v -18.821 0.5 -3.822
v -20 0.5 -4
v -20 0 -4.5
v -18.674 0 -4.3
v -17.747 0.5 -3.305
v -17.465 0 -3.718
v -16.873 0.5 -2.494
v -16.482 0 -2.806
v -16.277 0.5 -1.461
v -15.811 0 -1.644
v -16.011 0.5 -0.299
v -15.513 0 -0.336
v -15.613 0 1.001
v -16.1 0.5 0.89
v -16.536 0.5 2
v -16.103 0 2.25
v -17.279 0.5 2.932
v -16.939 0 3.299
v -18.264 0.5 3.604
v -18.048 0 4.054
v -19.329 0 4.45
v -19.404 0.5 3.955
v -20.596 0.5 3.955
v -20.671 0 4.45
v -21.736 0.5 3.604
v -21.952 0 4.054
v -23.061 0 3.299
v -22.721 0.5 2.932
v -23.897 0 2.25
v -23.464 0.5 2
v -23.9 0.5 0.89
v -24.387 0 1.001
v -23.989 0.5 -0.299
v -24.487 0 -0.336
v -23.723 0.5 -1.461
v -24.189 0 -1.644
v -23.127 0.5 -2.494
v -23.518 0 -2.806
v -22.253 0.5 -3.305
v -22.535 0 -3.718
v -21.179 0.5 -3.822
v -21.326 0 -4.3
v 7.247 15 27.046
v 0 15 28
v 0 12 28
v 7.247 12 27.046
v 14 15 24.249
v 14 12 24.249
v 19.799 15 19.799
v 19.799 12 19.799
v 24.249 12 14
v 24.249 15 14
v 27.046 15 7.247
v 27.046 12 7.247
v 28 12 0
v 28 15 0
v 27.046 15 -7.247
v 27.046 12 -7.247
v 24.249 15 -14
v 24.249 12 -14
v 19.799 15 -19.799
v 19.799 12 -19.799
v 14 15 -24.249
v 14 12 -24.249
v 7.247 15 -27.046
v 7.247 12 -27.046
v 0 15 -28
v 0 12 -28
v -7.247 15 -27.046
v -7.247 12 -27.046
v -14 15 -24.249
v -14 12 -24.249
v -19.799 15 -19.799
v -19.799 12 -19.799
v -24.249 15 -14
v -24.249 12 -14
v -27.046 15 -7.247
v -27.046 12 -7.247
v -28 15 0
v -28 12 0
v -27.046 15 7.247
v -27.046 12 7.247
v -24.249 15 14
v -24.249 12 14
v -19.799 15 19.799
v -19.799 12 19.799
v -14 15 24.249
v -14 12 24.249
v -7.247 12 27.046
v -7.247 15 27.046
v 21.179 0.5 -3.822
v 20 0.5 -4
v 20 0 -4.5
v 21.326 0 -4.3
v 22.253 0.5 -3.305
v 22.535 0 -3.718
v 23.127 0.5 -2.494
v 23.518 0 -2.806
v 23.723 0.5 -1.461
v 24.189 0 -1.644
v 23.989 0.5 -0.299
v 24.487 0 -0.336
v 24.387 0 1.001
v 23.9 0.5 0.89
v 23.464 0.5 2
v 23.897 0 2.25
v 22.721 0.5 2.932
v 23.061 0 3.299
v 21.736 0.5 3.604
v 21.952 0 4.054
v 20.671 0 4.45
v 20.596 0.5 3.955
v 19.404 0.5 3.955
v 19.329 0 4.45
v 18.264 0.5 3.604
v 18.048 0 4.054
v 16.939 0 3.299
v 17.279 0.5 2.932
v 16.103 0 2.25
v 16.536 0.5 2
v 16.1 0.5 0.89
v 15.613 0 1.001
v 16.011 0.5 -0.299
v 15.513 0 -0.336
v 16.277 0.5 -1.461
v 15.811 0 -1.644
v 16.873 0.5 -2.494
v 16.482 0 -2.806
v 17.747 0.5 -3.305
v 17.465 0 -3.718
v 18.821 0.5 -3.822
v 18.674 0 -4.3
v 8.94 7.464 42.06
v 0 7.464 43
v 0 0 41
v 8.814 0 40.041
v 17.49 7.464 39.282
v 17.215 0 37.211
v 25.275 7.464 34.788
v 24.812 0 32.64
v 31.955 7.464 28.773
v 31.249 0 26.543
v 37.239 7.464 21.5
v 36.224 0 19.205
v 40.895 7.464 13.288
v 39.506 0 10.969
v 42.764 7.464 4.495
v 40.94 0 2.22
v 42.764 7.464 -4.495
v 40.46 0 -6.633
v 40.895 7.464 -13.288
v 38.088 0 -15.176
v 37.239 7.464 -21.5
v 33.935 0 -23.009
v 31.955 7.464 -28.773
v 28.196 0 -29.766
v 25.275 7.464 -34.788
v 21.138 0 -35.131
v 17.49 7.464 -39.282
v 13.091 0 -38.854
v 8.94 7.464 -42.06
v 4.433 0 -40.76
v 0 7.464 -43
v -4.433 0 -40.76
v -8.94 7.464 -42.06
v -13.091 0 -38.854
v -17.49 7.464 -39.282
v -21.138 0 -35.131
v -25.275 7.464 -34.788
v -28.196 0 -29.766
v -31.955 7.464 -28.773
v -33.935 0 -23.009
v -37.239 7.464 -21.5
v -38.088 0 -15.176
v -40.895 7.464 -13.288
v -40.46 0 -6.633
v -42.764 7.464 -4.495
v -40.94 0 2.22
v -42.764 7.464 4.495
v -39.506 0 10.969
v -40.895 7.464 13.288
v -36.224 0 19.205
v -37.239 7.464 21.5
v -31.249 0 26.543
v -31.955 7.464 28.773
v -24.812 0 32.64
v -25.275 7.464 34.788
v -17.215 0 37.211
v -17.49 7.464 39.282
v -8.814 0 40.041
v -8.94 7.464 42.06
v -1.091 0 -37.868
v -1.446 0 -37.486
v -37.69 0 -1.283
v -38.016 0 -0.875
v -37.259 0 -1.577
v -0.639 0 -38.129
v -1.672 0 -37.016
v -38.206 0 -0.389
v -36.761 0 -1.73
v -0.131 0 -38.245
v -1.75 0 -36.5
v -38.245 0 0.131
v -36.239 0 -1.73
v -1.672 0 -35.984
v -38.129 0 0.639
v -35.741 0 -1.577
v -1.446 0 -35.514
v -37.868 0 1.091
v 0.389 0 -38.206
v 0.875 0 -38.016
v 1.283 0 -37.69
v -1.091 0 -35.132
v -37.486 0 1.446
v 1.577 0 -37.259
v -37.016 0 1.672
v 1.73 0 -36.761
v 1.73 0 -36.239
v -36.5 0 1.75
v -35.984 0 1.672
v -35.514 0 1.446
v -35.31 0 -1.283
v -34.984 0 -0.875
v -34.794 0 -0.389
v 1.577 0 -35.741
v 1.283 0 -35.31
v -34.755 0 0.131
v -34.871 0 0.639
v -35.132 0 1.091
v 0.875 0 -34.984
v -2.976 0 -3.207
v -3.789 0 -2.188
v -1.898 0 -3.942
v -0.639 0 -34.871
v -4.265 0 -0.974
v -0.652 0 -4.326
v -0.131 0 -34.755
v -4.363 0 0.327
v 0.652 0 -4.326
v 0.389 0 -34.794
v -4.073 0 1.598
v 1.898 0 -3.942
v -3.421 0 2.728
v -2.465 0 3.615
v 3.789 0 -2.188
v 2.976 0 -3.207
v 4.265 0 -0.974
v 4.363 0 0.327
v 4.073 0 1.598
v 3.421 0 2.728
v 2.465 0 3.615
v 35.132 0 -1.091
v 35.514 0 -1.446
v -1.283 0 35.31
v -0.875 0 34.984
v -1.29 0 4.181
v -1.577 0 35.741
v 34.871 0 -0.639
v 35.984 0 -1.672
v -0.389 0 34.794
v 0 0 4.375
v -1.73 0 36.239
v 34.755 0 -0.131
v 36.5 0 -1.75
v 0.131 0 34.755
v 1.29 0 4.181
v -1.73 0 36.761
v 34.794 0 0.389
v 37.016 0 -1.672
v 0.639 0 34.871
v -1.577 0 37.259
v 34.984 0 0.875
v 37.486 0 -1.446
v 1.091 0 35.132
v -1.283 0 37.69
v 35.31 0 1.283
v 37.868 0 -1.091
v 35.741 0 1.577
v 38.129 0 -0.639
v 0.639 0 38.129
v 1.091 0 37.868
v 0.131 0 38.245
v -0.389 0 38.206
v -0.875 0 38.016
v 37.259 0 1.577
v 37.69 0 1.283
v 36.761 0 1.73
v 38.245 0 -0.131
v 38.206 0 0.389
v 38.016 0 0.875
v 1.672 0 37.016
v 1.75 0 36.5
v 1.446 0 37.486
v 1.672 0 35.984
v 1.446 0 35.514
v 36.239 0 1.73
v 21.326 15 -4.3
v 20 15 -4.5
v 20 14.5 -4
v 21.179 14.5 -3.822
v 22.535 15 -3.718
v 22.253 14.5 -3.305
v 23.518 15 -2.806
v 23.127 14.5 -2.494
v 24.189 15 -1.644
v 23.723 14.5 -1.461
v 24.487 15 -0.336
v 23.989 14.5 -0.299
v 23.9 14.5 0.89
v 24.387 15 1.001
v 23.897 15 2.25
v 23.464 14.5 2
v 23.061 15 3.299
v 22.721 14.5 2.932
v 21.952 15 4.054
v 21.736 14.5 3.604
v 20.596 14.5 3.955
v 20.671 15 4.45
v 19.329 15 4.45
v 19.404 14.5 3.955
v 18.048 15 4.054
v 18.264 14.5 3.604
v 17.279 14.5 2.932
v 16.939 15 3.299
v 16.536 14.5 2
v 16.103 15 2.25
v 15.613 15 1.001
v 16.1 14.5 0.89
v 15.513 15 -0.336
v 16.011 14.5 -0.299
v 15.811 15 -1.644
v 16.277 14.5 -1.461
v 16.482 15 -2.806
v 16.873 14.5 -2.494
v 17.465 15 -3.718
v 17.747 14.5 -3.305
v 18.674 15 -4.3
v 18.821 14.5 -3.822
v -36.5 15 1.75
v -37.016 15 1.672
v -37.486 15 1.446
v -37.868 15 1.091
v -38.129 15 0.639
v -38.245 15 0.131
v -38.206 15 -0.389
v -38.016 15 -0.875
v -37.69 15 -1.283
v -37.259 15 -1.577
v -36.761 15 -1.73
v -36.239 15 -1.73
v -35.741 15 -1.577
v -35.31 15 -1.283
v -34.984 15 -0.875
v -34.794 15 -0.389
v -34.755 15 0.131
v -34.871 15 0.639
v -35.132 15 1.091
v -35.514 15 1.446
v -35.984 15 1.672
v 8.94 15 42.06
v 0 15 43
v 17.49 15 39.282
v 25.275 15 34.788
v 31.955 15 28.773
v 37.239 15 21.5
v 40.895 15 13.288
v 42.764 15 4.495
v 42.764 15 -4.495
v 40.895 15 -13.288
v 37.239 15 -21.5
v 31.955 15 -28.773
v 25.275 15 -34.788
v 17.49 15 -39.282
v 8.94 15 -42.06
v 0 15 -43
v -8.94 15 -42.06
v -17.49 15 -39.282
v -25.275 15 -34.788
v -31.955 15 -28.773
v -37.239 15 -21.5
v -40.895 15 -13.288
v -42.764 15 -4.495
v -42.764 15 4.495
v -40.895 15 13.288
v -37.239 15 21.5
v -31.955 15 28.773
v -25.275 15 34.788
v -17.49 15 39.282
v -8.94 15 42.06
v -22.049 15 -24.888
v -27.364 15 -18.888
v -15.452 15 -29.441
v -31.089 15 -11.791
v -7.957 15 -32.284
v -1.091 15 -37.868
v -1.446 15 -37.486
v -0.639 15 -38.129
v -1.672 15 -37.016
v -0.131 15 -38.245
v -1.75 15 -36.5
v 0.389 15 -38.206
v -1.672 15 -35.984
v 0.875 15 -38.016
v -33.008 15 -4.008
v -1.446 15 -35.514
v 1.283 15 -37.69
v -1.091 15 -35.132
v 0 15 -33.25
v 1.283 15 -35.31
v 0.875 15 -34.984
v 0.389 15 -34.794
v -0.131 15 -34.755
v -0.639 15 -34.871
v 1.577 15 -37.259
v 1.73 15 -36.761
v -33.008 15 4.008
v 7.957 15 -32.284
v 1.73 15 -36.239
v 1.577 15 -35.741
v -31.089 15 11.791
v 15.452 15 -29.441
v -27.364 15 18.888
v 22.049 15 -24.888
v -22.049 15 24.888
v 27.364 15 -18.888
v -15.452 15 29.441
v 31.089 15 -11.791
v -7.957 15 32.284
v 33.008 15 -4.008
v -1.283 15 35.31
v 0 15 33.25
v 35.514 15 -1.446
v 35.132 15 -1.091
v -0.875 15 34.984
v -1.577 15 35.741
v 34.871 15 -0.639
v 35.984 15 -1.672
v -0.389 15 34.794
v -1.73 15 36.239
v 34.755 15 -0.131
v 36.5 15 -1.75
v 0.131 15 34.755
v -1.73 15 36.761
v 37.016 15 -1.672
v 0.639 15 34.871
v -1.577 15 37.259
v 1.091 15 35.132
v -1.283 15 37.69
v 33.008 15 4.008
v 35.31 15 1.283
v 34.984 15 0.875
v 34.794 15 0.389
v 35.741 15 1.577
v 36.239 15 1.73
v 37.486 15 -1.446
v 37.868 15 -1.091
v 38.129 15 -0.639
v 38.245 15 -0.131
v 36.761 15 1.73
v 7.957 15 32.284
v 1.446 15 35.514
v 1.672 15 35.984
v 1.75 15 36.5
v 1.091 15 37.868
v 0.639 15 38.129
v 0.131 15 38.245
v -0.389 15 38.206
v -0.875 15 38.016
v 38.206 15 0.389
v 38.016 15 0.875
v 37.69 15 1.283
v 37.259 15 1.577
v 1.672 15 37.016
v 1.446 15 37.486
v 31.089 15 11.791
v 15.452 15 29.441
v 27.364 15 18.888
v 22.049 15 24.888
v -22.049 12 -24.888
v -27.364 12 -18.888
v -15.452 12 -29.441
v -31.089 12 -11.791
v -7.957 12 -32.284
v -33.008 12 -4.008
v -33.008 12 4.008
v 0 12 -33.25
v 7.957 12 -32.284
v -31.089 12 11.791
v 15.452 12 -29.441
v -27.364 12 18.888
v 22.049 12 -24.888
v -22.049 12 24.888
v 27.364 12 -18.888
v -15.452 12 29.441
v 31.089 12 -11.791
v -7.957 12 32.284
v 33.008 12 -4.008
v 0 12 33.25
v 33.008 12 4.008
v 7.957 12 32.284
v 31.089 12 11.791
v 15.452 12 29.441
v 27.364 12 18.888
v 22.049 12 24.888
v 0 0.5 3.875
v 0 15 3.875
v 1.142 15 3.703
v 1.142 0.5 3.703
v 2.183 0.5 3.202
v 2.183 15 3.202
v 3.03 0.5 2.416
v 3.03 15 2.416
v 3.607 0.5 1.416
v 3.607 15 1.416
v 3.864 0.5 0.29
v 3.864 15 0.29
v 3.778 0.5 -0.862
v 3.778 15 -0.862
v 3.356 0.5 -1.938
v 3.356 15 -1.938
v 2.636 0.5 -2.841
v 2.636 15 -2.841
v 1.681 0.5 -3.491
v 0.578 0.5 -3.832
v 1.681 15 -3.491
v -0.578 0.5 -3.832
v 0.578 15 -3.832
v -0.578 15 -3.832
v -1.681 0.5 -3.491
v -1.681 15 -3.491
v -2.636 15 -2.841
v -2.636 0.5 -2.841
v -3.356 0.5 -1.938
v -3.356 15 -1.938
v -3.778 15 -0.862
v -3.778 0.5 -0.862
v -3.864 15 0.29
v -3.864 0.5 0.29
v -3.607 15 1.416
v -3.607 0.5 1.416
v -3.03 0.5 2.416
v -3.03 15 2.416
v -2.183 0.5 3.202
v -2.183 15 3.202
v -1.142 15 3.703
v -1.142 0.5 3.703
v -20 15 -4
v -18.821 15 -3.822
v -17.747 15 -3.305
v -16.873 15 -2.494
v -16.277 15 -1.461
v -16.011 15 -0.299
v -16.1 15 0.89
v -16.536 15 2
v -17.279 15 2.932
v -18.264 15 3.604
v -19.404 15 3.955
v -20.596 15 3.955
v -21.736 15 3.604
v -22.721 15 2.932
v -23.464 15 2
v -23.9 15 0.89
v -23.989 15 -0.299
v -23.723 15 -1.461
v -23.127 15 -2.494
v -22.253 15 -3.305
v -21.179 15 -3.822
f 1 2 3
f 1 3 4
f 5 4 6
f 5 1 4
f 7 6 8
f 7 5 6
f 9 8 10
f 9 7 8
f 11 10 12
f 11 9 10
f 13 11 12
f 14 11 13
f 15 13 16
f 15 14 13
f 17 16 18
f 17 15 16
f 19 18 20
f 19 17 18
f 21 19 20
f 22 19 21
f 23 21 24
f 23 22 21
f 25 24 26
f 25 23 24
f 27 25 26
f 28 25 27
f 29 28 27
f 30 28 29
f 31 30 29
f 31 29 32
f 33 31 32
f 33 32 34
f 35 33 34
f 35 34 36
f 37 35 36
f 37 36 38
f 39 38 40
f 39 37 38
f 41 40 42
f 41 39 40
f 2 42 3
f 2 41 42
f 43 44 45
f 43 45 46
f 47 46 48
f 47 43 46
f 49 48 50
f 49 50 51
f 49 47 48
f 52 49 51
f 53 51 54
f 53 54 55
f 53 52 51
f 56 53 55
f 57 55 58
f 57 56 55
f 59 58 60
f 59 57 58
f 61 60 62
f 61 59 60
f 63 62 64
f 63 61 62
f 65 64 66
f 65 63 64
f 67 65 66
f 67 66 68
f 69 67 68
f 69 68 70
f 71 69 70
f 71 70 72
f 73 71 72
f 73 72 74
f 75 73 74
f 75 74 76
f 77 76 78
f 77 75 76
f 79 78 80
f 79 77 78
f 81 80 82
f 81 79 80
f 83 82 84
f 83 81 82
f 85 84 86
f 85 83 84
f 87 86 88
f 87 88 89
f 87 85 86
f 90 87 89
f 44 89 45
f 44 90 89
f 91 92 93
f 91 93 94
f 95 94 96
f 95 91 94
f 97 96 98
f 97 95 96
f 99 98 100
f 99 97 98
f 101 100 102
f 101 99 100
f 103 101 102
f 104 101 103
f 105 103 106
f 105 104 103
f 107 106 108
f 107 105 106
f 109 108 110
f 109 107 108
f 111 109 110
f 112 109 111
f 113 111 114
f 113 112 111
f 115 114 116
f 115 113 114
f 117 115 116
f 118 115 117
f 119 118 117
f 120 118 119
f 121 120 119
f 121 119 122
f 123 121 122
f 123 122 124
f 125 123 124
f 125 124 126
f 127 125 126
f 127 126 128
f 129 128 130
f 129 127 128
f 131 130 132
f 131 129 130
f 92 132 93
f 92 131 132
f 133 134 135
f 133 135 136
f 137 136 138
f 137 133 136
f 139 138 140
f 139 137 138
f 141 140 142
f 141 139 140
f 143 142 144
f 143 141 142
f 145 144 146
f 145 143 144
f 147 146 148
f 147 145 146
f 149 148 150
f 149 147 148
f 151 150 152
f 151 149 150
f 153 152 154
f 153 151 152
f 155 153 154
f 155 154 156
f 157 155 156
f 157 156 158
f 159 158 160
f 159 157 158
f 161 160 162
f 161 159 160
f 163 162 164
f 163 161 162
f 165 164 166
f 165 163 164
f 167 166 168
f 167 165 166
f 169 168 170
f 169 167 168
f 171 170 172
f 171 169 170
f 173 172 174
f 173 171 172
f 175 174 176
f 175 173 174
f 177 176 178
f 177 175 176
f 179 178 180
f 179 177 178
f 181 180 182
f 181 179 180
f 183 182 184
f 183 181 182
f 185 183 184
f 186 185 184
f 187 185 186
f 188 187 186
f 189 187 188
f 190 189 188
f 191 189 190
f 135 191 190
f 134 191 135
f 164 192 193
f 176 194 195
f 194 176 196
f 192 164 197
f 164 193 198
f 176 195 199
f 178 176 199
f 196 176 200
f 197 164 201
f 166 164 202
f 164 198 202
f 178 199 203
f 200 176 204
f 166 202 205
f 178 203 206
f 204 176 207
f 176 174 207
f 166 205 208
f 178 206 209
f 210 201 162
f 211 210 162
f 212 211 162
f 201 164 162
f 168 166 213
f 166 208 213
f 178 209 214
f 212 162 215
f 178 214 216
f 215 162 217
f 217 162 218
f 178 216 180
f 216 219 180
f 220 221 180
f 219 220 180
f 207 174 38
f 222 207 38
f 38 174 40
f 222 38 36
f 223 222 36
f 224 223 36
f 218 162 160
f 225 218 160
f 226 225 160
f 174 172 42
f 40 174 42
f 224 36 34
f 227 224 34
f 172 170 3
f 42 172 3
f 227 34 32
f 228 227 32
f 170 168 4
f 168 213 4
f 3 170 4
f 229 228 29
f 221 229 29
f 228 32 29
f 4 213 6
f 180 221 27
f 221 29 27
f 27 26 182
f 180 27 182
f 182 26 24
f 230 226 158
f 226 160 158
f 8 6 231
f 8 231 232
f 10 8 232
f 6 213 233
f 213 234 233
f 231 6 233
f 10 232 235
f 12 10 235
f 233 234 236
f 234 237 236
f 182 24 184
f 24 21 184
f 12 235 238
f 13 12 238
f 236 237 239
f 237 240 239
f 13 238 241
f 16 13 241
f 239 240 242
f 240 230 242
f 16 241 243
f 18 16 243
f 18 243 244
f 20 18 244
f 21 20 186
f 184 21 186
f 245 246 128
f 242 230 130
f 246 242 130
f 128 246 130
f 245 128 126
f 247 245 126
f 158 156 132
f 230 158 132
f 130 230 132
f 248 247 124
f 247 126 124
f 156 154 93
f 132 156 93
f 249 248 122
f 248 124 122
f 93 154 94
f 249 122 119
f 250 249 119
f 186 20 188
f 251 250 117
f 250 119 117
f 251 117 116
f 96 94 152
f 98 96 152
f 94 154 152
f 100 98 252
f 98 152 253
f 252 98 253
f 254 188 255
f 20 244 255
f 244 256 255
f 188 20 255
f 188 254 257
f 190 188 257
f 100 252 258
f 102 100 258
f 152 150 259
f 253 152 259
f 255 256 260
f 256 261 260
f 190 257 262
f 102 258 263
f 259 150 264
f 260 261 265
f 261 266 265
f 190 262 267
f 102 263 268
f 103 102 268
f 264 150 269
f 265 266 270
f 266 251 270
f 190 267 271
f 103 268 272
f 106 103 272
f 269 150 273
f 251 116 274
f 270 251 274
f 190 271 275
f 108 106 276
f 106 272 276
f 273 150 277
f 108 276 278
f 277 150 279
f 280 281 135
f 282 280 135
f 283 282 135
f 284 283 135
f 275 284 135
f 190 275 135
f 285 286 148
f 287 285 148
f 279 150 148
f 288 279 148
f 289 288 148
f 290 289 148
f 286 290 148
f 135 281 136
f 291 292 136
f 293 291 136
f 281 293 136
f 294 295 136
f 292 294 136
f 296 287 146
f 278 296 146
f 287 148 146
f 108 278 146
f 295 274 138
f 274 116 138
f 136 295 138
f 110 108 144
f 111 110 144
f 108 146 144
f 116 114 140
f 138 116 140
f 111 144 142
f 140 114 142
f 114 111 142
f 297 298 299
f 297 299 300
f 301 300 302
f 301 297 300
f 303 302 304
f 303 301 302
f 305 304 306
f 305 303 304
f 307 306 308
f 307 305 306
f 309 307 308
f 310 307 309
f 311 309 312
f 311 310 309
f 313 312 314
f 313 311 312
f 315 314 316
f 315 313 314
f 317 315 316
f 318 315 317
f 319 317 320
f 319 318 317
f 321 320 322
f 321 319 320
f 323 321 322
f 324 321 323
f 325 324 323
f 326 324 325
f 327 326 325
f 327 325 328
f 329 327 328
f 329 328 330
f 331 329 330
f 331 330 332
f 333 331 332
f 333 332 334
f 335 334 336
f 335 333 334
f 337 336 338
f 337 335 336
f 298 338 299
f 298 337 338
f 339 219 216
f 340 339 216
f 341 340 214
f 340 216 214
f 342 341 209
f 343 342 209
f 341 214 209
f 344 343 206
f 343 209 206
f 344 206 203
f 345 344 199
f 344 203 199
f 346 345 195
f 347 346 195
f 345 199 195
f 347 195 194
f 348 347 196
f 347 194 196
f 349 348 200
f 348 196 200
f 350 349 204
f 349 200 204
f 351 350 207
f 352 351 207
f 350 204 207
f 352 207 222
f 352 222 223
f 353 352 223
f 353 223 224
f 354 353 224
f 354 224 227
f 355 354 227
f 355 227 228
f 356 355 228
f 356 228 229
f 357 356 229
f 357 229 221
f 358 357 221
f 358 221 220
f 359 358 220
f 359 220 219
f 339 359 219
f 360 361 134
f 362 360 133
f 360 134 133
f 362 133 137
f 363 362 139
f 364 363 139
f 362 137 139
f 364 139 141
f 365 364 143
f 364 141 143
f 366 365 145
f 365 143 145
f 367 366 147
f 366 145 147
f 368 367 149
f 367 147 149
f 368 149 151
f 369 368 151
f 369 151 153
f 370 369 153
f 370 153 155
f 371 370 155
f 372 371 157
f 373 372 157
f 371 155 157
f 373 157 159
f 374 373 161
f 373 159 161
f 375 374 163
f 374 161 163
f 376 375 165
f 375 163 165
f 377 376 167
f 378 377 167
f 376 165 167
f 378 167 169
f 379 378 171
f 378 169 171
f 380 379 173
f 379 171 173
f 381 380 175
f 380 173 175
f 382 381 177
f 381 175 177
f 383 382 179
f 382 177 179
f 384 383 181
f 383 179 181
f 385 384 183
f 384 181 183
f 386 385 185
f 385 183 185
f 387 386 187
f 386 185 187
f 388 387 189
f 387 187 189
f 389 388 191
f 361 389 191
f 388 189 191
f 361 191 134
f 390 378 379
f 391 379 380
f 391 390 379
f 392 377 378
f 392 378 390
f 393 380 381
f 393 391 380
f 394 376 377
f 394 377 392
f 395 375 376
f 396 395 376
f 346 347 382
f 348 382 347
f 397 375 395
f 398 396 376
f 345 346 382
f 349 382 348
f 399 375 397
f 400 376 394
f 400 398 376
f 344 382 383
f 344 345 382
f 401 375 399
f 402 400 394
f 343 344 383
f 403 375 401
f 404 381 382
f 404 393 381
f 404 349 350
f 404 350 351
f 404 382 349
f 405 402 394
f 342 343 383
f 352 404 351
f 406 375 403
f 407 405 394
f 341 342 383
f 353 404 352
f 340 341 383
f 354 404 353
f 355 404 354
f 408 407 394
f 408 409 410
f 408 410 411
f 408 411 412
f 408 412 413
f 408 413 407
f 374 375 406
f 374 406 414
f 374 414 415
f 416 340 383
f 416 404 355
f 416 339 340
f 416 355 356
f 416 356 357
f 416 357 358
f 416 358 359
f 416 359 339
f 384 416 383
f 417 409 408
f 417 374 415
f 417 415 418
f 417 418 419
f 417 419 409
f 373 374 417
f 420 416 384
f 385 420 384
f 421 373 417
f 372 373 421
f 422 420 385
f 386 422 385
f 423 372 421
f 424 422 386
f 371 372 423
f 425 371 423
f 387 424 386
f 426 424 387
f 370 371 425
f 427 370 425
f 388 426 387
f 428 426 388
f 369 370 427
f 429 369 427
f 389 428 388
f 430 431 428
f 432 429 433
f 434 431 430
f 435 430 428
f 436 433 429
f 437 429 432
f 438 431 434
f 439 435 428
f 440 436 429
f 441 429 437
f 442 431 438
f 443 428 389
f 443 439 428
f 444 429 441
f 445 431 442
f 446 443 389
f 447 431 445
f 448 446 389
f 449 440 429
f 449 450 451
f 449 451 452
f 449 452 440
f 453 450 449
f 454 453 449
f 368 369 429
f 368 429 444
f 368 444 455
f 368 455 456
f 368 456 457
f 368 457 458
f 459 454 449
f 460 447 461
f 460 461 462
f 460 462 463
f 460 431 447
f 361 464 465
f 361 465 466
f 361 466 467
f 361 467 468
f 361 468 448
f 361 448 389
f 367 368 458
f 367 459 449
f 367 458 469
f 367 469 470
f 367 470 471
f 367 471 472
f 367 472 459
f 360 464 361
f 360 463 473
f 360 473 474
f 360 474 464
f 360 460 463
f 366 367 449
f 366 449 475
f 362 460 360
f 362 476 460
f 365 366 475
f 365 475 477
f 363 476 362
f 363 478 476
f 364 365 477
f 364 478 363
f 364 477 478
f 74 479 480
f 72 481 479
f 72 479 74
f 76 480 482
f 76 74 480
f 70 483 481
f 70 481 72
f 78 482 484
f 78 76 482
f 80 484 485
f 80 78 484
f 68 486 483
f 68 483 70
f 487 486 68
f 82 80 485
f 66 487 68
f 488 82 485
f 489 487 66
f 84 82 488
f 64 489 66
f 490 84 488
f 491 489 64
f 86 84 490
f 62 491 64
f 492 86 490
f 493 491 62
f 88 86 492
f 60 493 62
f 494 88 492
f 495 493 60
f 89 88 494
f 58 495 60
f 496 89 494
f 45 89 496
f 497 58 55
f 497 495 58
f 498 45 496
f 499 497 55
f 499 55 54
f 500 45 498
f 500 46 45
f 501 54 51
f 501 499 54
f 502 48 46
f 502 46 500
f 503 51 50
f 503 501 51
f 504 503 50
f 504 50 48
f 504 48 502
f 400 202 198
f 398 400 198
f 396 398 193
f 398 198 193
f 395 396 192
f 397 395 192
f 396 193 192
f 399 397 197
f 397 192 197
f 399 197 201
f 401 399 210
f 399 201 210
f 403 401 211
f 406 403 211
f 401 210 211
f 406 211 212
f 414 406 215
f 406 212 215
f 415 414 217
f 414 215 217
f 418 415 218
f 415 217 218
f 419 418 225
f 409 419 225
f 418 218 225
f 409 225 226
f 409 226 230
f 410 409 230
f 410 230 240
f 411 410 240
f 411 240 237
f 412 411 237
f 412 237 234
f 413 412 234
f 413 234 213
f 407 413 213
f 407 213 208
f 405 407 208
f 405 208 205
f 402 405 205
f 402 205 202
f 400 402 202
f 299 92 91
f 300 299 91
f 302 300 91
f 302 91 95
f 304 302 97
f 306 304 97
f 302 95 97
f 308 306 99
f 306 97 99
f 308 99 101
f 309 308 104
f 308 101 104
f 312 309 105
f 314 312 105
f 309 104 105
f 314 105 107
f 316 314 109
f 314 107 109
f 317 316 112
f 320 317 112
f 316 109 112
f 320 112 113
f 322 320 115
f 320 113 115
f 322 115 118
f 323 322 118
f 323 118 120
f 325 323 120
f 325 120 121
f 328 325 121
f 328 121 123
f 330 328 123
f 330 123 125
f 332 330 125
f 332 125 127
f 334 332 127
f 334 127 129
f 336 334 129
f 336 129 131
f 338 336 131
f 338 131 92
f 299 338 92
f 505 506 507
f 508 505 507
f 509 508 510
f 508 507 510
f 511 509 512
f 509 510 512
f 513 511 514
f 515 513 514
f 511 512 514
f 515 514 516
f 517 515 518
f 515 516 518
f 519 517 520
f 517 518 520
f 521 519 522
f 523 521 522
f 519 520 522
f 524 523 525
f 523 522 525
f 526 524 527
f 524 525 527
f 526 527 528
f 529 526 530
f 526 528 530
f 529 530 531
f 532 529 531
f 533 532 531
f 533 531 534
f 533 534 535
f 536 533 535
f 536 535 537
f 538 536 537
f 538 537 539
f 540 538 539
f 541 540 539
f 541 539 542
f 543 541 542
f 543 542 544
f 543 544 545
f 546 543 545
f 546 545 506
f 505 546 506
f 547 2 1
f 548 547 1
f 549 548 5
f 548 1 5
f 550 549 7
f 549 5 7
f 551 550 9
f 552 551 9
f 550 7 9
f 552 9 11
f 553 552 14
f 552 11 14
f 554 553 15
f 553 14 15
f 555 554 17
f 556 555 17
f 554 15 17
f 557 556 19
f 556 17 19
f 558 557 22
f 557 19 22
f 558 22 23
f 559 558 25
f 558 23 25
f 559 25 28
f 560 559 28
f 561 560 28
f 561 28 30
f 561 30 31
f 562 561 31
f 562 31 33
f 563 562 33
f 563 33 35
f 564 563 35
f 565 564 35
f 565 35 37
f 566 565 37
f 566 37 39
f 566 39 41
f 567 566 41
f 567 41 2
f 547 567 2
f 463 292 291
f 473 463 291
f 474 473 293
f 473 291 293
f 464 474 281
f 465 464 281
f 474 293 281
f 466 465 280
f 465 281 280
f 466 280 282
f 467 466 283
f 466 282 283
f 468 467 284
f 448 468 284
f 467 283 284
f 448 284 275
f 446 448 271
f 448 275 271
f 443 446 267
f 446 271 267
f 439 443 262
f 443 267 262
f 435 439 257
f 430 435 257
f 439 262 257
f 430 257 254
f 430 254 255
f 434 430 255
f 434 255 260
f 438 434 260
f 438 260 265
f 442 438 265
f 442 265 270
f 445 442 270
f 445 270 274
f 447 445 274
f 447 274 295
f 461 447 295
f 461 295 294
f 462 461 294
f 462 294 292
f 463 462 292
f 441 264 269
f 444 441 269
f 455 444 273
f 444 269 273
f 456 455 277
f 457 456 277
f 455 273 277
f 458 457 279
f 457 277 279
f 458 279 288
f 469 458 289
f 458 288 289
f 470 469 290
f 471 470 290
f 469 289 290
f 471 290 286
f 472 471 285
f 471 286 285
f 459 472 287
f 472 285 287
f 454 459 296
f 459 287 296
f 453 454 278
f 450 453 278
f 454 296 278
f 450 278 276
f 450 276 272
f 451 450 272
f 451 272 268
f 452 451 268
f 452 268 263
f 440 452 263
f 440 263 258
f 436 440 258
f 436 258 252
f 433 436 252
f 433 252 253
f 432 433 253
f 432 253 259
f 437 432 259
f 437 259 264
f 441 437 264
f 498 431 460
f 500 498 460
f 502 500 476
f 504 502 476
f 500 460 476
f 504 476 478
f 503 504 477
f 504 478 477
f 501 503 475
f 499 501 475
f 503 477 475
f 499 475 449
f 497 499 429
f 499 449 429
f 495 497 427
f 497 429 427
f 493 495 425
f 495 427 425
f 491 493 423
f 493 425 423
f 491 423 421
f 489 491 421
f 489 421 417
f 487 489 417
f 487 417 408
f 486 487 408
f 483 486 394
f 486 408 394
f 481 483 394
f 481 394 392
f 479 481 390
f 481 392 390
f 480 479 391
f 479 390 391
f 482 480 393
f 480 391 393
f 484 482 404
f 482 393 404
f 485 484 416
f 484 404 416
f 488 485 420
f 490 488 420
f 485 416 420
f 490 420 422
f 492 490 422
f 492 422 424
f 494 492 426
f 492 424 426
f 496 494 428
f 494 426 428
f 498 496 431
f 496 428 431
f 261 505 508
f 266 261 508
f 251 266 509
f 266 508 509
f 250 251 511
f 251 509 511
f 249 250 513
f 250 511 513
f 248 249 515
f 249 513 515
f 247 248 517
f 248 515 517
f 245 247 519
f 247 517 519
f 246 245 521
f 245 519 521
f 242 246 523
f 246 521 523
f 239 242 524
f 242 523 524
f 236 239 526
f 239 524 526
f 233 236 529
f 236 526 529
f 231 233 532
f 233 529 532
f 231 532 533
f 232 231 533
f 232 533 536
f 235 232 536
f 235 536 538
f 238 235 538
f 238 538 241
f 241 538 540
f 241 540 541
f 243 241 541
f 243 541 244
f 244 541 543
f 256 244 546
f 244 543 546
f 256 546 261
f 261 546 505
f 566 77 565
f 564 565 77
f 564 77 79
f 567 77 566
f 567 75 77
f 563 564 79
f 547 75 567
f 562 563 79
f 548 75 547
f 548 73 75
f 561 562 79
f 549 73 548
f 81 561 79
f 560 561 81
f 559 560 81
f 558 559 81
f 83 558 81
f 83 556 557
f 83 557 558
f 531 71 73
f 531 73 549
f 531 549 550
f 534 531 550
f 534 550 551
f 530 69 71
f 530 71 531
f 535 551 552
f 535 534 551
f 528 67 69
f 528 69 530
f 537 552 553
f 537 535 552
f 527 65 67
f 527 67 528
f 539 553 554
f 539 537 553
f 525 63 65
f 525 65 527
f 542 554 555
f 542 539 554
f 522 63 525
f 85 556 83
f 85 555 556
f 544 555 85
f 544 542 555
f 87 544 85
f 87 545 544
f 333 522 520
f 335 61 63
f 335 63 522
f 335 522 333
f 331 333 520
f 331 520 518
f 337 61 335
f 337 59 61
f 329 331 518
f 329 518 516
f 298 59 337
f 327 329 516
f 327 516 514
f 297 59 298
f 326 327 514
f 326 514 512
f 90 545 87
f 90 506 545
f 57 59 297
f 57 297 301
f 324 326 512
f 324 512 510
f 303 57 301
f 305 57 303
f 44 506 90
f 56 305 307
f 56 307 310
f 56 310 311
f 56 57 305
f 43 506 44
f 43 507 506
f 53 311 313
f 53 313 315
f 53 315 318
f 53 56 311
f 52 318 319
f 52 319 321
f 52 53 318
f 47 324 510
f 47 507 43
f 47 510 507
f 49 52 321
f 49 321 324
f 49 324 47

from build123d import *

# Parameters (mm, degrees)
SKETCH1_R           = 43
BOSS_EXTRUDE1_DEPTH = 15
SKETCH2_R           = 4
CUT_EXTRUDE1_DEPTH  = 63.633856659
SKETCH3_R           = 3.875
CUT_EXTRUDE2_DEPTH  = 63.633856659
SKETCH4_R           = 33.25
SKETCH4_R_2         = 28
CUT_EXTRUDE3_DEPTH  = 3
SKETCH5_R           = 1.75
CUT_EXTRUDE4_DEPTH  = 63.633856659
CIRPATTERN1_COUNT   = 4
CHAMFER1_SIZE       = 2
CHAMFER1_SIZE2      = 7.464101615
CHAMFER2_SIZE       = 0.5


with BuildPart() as part:
    # Sketch1 → Boss-Extrude1 (new body)
    with BuildSketch(Plane(origin=(0, 0, 0), x_dir=(1, 0, 0), z_dir=(0, 1, 0))):
        with Locations(Location((0, 0, 0), (0, 0, 270))):
            Circle(SKETCH1_R)
    extrude(amount=BOSS_EXTRUDE1_DEPTH)

    # Sketch2 → Cut-Extrude1 (cut, through all)
    with BuildSketch(Plane.XZ):
        with Locations(Location((20, 0, 0), (0, 0, 270))):
            Circle(SKETCH2_R)
        with Locations(Location((-20, 0, 0), (0, 0, 270))):
            Circle(SKETCH2_R)
    extrude(amount=-CUT_EXTRUDE1_DEPTH, mode=Mode.SUBTRACT)

    # Sketch3 → Cut-Extrude2 (cut, through all)
    with BuildSketch(Plane(origin=(0, 15, 0), x_dir=(1, 0, 0), z_dir=(0, 1, 0))):
        with Locations(Location((0, 0, 0), (0, 0, 270))):
            Circle(SKETCH3_R)
    extrude(amount=-CUT_EXTRUDE2_DEPTH, mode=Mode.SUBTRACT)

    # Sketch4 → Cut-Extrude3 (cut)
    with BuildSketch(Plane(origin=(0, 15, 0), x_dir=(1, 0, 0), z_dir=(0, 1, 0))):
        with Locations(Location((0, 0, 0), (0, 0, 270))):
            Circle(SKETCH4_R)
        with Locations(Location((0, 0, 0), (0, 0, 270))):
            Circle(SKETCH4_R_2, mode=Mode.SUBTRACT)
    extrude(amount=-CUT_EXTRUDE3_DEPTH, mode=Mode.SUBTRACT)

    # Sketch5 → Cut-Extrude4 (cut, through all)
    with BuildSketch(Plane.XZ):
        with Locations(Location((36.5, 0, 0), (0, 0, 270))):
            Circle(SKETCH5_R)
    cut_extrude4 = extrude(amount=-CUT_EXTRUDE4_DEPTH, mode=Mode.SUBTRACT)

    # CirPattern1: Cut-Extrude4 ×4 about axis
    cirpattern1_axis = Axis((0, 0, 0), (0, 1, 0))
    for i in range(1, CIRPATTERN1_COUNT):
        add(cut_extrude4.rotate(cirpattern1_axis, i * 360 / CIRPATTERN1_COUNT), mode=Mode.SUBTRACT)

    # Chamfer1
    chamfer1_edges = [part.edges().sort_by_distance(p)[0] for p in [
        (0, 0, -43),
    ]]
    chamfer1_side = [part.faces().sort_by_distance(p)[0] for p in [
        (0, 0, -41.783776336),
    ]]
    chamfer(chamfer1_edges, length=CHAMFER1_SIZE, length2=CHAMFER1_SIZE2, reference=chamfer1_side[0])

    # Chamfer2
    chamfer2_edges = [part.edges().sort_by_distance(p)[0] for p in [
        (-20, 0, 4),
        (0, 0, -3.875),
        (20, 15, 4),
        (20, 0, 4),
    ]]
    chamfer(chamfer2_edges, length=CHAMFER2_SIZE)


solid = part.part
